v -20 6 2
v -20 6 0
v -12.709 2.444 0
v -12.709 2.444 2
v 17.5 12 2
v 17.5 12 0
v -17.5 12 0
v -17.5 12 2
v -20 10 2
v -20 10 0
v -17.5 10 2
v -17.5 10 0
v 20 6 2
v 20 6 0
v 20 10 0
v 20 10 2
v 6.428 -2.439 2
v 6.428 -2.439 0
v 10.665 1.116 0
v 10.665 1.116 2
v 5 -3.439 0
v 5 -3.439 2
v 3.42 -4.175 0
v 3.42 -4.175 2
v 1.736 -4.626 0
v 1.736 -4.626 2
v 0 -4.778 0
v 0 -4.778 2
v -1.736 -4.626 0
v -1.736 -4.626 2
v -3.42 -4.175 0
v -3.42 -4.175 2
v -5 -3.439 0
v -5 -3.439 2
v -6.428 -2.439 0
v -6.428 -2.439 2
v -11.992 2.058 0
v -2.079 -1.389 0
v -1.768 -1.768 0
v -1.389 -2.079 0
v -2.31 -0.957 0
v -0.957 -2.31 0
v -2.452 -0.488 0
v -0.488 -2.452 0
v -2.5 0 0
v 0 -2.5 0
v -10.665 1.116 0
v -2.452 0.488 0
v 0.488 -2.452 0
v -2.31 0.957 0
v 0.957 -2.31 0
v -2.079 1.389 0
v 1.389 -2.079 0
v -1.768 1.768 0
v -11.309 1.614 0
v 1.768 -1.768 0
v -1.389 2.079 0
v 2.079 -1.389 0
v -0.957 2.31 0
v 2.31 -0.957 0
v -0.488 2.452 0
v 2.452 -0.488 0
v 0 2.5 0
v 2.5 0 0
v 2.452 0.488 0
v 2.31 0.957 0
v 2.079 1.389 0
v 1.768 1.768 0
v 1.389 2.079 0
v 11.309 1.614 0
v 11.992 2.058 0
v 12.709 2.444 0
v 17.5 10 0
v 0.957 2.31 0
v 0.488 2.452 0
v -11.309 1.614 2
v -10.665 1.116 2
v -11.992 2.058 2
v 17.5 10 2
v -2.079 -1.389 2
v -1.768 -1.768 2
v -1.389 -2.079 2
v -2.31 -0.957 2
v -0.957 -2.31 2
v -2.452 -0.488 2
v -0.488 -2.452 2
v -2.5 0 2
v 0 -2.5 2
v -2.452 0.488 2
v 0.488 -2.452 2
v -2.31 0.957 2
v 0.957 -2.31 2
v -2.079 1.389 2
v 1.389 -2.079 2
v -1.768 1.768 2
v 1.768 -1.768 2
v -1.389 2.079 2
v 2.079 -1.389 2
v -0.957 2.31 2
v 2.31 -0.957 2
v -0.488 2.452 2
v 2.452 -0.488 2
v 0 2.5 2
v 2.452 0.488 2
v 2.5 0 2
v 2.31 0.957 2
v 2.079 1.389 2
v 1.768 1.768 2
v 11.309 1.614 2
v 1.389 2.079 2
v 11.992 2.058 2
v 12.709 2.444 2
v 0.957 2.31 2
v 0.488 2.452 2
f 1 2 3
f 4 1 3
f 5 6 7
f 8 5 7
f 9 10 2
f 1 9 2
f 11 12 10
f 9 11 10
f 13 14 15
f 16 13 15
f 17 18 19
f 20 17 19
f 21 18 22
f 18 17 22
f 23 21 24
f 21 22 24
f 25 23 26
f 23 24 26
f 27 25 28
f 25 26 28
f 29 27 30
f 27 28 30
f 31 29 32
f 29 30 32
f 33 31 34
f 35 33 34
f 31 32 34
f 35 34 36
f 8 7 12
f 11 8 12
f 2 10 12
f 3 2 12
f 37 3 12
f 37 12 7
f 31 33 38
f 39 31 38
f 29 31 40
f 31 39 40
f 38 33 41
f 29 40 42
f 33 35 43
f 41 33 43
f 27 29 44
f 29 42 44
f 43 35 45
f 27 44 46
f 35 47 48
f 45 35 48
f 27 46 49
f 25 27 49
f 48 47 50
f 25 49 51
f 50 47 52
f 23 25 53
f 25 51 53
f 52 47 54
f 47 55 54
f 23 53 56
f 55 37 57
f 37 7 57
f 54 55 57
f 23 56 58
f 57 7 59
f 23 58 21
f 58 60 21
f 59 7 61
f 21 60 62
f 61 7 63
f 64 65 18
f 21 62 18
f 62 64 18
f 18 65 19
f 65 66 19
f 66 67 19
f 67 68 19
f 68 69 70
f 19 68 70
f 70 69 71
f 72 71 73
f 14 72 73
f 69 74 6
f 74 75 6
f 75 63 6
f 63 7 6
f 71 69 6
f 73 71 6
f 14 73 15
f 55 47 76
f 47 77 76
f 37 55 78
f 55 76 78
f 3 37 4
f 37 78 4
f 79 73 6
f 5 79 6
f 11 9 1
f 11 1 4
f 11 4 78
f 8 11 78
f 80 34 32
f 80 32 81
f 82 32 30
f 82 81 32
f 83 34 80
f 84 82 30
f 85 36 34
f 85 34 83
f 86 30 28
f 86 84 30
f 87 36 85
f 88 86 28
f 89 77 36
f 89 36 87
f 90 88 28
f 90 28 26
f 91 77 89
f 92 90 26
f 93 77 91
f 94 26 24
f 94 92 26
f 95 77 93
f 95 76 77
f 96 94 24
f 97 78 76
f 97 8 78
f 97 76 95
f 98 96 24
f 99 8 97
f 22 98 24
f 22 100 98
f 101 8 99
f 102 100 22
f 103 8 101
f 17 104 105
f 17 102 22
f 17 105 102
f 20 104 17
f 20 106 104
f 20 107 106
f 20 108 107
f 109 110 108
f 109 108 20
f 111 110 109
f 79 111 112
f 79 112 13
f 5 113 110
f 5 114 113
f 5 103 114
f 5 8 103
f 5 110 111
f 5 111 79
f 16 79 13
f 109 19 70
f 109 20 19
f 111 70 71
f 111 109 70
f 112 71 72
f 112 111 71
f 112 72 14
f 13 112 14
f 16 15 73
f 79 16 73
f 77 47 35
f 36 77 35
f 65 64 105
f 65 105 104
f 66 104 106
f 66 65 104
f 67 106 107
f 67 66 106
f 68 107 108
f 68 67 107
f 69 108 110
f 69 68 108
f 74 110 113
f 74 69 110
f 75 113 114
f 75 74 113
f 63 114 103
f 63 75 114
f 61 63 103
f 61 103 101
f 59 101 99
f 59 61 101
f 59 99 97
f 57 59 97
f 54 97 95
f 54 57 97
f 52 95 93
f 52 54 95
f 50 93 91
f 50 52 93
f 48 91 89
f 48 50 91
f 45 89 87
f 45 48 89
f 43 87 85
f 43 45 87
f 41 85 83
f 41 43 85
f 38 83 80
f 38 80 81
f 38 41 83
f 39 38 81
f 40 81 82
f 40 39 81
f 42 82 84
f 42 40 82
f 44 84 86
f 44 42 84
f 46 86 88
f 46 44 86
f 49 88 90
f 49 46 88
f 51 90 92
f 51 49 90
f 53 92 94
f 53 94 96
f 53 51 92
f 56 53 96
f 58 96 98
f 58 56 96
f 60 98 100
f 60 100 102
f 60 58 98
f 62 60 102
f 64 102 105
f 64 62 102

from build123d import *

# Parameters (mm, degrees)
SKETCH_1_R      = 2.5
EXTRUDE_1_DEPTH = 2
FILLET_1_R      = 10


with BuildPart() as part:
    # ｽｹｯﾁ1 → ﾎﾞｽ - 押し出し1 (new body)
    with BuildSketch(Plane.XY):
        Polygon((0, -7.832443736), (11.605504985, 1.905731217), (20, 6), (20, 10), (17.5, 10), (17.5, 12), (-17.5, 12), (-17.5, 10), (-20, 10), (-20, 6), (-11.605504985, 1.905731217), align=None)
        Circle(SKETCH_1_R, mode=Mode.SUBTRACT)
    extrude(amount=EXTRUDE_1_DEPTH)

    # ﾌｨﾚｯﾄ1
    fillet_1_edges = [part.edges().sort_by_distance(p)[0] for p in [
        (11.605504985, 1.905731217, 1),
        (0, -7.832443736, 1),
        (-11.605504985, 1.905731217, 1),
    ]]
    fillet(fillet_1_edges, radius=FILLET_1_R)


solid = part.part
